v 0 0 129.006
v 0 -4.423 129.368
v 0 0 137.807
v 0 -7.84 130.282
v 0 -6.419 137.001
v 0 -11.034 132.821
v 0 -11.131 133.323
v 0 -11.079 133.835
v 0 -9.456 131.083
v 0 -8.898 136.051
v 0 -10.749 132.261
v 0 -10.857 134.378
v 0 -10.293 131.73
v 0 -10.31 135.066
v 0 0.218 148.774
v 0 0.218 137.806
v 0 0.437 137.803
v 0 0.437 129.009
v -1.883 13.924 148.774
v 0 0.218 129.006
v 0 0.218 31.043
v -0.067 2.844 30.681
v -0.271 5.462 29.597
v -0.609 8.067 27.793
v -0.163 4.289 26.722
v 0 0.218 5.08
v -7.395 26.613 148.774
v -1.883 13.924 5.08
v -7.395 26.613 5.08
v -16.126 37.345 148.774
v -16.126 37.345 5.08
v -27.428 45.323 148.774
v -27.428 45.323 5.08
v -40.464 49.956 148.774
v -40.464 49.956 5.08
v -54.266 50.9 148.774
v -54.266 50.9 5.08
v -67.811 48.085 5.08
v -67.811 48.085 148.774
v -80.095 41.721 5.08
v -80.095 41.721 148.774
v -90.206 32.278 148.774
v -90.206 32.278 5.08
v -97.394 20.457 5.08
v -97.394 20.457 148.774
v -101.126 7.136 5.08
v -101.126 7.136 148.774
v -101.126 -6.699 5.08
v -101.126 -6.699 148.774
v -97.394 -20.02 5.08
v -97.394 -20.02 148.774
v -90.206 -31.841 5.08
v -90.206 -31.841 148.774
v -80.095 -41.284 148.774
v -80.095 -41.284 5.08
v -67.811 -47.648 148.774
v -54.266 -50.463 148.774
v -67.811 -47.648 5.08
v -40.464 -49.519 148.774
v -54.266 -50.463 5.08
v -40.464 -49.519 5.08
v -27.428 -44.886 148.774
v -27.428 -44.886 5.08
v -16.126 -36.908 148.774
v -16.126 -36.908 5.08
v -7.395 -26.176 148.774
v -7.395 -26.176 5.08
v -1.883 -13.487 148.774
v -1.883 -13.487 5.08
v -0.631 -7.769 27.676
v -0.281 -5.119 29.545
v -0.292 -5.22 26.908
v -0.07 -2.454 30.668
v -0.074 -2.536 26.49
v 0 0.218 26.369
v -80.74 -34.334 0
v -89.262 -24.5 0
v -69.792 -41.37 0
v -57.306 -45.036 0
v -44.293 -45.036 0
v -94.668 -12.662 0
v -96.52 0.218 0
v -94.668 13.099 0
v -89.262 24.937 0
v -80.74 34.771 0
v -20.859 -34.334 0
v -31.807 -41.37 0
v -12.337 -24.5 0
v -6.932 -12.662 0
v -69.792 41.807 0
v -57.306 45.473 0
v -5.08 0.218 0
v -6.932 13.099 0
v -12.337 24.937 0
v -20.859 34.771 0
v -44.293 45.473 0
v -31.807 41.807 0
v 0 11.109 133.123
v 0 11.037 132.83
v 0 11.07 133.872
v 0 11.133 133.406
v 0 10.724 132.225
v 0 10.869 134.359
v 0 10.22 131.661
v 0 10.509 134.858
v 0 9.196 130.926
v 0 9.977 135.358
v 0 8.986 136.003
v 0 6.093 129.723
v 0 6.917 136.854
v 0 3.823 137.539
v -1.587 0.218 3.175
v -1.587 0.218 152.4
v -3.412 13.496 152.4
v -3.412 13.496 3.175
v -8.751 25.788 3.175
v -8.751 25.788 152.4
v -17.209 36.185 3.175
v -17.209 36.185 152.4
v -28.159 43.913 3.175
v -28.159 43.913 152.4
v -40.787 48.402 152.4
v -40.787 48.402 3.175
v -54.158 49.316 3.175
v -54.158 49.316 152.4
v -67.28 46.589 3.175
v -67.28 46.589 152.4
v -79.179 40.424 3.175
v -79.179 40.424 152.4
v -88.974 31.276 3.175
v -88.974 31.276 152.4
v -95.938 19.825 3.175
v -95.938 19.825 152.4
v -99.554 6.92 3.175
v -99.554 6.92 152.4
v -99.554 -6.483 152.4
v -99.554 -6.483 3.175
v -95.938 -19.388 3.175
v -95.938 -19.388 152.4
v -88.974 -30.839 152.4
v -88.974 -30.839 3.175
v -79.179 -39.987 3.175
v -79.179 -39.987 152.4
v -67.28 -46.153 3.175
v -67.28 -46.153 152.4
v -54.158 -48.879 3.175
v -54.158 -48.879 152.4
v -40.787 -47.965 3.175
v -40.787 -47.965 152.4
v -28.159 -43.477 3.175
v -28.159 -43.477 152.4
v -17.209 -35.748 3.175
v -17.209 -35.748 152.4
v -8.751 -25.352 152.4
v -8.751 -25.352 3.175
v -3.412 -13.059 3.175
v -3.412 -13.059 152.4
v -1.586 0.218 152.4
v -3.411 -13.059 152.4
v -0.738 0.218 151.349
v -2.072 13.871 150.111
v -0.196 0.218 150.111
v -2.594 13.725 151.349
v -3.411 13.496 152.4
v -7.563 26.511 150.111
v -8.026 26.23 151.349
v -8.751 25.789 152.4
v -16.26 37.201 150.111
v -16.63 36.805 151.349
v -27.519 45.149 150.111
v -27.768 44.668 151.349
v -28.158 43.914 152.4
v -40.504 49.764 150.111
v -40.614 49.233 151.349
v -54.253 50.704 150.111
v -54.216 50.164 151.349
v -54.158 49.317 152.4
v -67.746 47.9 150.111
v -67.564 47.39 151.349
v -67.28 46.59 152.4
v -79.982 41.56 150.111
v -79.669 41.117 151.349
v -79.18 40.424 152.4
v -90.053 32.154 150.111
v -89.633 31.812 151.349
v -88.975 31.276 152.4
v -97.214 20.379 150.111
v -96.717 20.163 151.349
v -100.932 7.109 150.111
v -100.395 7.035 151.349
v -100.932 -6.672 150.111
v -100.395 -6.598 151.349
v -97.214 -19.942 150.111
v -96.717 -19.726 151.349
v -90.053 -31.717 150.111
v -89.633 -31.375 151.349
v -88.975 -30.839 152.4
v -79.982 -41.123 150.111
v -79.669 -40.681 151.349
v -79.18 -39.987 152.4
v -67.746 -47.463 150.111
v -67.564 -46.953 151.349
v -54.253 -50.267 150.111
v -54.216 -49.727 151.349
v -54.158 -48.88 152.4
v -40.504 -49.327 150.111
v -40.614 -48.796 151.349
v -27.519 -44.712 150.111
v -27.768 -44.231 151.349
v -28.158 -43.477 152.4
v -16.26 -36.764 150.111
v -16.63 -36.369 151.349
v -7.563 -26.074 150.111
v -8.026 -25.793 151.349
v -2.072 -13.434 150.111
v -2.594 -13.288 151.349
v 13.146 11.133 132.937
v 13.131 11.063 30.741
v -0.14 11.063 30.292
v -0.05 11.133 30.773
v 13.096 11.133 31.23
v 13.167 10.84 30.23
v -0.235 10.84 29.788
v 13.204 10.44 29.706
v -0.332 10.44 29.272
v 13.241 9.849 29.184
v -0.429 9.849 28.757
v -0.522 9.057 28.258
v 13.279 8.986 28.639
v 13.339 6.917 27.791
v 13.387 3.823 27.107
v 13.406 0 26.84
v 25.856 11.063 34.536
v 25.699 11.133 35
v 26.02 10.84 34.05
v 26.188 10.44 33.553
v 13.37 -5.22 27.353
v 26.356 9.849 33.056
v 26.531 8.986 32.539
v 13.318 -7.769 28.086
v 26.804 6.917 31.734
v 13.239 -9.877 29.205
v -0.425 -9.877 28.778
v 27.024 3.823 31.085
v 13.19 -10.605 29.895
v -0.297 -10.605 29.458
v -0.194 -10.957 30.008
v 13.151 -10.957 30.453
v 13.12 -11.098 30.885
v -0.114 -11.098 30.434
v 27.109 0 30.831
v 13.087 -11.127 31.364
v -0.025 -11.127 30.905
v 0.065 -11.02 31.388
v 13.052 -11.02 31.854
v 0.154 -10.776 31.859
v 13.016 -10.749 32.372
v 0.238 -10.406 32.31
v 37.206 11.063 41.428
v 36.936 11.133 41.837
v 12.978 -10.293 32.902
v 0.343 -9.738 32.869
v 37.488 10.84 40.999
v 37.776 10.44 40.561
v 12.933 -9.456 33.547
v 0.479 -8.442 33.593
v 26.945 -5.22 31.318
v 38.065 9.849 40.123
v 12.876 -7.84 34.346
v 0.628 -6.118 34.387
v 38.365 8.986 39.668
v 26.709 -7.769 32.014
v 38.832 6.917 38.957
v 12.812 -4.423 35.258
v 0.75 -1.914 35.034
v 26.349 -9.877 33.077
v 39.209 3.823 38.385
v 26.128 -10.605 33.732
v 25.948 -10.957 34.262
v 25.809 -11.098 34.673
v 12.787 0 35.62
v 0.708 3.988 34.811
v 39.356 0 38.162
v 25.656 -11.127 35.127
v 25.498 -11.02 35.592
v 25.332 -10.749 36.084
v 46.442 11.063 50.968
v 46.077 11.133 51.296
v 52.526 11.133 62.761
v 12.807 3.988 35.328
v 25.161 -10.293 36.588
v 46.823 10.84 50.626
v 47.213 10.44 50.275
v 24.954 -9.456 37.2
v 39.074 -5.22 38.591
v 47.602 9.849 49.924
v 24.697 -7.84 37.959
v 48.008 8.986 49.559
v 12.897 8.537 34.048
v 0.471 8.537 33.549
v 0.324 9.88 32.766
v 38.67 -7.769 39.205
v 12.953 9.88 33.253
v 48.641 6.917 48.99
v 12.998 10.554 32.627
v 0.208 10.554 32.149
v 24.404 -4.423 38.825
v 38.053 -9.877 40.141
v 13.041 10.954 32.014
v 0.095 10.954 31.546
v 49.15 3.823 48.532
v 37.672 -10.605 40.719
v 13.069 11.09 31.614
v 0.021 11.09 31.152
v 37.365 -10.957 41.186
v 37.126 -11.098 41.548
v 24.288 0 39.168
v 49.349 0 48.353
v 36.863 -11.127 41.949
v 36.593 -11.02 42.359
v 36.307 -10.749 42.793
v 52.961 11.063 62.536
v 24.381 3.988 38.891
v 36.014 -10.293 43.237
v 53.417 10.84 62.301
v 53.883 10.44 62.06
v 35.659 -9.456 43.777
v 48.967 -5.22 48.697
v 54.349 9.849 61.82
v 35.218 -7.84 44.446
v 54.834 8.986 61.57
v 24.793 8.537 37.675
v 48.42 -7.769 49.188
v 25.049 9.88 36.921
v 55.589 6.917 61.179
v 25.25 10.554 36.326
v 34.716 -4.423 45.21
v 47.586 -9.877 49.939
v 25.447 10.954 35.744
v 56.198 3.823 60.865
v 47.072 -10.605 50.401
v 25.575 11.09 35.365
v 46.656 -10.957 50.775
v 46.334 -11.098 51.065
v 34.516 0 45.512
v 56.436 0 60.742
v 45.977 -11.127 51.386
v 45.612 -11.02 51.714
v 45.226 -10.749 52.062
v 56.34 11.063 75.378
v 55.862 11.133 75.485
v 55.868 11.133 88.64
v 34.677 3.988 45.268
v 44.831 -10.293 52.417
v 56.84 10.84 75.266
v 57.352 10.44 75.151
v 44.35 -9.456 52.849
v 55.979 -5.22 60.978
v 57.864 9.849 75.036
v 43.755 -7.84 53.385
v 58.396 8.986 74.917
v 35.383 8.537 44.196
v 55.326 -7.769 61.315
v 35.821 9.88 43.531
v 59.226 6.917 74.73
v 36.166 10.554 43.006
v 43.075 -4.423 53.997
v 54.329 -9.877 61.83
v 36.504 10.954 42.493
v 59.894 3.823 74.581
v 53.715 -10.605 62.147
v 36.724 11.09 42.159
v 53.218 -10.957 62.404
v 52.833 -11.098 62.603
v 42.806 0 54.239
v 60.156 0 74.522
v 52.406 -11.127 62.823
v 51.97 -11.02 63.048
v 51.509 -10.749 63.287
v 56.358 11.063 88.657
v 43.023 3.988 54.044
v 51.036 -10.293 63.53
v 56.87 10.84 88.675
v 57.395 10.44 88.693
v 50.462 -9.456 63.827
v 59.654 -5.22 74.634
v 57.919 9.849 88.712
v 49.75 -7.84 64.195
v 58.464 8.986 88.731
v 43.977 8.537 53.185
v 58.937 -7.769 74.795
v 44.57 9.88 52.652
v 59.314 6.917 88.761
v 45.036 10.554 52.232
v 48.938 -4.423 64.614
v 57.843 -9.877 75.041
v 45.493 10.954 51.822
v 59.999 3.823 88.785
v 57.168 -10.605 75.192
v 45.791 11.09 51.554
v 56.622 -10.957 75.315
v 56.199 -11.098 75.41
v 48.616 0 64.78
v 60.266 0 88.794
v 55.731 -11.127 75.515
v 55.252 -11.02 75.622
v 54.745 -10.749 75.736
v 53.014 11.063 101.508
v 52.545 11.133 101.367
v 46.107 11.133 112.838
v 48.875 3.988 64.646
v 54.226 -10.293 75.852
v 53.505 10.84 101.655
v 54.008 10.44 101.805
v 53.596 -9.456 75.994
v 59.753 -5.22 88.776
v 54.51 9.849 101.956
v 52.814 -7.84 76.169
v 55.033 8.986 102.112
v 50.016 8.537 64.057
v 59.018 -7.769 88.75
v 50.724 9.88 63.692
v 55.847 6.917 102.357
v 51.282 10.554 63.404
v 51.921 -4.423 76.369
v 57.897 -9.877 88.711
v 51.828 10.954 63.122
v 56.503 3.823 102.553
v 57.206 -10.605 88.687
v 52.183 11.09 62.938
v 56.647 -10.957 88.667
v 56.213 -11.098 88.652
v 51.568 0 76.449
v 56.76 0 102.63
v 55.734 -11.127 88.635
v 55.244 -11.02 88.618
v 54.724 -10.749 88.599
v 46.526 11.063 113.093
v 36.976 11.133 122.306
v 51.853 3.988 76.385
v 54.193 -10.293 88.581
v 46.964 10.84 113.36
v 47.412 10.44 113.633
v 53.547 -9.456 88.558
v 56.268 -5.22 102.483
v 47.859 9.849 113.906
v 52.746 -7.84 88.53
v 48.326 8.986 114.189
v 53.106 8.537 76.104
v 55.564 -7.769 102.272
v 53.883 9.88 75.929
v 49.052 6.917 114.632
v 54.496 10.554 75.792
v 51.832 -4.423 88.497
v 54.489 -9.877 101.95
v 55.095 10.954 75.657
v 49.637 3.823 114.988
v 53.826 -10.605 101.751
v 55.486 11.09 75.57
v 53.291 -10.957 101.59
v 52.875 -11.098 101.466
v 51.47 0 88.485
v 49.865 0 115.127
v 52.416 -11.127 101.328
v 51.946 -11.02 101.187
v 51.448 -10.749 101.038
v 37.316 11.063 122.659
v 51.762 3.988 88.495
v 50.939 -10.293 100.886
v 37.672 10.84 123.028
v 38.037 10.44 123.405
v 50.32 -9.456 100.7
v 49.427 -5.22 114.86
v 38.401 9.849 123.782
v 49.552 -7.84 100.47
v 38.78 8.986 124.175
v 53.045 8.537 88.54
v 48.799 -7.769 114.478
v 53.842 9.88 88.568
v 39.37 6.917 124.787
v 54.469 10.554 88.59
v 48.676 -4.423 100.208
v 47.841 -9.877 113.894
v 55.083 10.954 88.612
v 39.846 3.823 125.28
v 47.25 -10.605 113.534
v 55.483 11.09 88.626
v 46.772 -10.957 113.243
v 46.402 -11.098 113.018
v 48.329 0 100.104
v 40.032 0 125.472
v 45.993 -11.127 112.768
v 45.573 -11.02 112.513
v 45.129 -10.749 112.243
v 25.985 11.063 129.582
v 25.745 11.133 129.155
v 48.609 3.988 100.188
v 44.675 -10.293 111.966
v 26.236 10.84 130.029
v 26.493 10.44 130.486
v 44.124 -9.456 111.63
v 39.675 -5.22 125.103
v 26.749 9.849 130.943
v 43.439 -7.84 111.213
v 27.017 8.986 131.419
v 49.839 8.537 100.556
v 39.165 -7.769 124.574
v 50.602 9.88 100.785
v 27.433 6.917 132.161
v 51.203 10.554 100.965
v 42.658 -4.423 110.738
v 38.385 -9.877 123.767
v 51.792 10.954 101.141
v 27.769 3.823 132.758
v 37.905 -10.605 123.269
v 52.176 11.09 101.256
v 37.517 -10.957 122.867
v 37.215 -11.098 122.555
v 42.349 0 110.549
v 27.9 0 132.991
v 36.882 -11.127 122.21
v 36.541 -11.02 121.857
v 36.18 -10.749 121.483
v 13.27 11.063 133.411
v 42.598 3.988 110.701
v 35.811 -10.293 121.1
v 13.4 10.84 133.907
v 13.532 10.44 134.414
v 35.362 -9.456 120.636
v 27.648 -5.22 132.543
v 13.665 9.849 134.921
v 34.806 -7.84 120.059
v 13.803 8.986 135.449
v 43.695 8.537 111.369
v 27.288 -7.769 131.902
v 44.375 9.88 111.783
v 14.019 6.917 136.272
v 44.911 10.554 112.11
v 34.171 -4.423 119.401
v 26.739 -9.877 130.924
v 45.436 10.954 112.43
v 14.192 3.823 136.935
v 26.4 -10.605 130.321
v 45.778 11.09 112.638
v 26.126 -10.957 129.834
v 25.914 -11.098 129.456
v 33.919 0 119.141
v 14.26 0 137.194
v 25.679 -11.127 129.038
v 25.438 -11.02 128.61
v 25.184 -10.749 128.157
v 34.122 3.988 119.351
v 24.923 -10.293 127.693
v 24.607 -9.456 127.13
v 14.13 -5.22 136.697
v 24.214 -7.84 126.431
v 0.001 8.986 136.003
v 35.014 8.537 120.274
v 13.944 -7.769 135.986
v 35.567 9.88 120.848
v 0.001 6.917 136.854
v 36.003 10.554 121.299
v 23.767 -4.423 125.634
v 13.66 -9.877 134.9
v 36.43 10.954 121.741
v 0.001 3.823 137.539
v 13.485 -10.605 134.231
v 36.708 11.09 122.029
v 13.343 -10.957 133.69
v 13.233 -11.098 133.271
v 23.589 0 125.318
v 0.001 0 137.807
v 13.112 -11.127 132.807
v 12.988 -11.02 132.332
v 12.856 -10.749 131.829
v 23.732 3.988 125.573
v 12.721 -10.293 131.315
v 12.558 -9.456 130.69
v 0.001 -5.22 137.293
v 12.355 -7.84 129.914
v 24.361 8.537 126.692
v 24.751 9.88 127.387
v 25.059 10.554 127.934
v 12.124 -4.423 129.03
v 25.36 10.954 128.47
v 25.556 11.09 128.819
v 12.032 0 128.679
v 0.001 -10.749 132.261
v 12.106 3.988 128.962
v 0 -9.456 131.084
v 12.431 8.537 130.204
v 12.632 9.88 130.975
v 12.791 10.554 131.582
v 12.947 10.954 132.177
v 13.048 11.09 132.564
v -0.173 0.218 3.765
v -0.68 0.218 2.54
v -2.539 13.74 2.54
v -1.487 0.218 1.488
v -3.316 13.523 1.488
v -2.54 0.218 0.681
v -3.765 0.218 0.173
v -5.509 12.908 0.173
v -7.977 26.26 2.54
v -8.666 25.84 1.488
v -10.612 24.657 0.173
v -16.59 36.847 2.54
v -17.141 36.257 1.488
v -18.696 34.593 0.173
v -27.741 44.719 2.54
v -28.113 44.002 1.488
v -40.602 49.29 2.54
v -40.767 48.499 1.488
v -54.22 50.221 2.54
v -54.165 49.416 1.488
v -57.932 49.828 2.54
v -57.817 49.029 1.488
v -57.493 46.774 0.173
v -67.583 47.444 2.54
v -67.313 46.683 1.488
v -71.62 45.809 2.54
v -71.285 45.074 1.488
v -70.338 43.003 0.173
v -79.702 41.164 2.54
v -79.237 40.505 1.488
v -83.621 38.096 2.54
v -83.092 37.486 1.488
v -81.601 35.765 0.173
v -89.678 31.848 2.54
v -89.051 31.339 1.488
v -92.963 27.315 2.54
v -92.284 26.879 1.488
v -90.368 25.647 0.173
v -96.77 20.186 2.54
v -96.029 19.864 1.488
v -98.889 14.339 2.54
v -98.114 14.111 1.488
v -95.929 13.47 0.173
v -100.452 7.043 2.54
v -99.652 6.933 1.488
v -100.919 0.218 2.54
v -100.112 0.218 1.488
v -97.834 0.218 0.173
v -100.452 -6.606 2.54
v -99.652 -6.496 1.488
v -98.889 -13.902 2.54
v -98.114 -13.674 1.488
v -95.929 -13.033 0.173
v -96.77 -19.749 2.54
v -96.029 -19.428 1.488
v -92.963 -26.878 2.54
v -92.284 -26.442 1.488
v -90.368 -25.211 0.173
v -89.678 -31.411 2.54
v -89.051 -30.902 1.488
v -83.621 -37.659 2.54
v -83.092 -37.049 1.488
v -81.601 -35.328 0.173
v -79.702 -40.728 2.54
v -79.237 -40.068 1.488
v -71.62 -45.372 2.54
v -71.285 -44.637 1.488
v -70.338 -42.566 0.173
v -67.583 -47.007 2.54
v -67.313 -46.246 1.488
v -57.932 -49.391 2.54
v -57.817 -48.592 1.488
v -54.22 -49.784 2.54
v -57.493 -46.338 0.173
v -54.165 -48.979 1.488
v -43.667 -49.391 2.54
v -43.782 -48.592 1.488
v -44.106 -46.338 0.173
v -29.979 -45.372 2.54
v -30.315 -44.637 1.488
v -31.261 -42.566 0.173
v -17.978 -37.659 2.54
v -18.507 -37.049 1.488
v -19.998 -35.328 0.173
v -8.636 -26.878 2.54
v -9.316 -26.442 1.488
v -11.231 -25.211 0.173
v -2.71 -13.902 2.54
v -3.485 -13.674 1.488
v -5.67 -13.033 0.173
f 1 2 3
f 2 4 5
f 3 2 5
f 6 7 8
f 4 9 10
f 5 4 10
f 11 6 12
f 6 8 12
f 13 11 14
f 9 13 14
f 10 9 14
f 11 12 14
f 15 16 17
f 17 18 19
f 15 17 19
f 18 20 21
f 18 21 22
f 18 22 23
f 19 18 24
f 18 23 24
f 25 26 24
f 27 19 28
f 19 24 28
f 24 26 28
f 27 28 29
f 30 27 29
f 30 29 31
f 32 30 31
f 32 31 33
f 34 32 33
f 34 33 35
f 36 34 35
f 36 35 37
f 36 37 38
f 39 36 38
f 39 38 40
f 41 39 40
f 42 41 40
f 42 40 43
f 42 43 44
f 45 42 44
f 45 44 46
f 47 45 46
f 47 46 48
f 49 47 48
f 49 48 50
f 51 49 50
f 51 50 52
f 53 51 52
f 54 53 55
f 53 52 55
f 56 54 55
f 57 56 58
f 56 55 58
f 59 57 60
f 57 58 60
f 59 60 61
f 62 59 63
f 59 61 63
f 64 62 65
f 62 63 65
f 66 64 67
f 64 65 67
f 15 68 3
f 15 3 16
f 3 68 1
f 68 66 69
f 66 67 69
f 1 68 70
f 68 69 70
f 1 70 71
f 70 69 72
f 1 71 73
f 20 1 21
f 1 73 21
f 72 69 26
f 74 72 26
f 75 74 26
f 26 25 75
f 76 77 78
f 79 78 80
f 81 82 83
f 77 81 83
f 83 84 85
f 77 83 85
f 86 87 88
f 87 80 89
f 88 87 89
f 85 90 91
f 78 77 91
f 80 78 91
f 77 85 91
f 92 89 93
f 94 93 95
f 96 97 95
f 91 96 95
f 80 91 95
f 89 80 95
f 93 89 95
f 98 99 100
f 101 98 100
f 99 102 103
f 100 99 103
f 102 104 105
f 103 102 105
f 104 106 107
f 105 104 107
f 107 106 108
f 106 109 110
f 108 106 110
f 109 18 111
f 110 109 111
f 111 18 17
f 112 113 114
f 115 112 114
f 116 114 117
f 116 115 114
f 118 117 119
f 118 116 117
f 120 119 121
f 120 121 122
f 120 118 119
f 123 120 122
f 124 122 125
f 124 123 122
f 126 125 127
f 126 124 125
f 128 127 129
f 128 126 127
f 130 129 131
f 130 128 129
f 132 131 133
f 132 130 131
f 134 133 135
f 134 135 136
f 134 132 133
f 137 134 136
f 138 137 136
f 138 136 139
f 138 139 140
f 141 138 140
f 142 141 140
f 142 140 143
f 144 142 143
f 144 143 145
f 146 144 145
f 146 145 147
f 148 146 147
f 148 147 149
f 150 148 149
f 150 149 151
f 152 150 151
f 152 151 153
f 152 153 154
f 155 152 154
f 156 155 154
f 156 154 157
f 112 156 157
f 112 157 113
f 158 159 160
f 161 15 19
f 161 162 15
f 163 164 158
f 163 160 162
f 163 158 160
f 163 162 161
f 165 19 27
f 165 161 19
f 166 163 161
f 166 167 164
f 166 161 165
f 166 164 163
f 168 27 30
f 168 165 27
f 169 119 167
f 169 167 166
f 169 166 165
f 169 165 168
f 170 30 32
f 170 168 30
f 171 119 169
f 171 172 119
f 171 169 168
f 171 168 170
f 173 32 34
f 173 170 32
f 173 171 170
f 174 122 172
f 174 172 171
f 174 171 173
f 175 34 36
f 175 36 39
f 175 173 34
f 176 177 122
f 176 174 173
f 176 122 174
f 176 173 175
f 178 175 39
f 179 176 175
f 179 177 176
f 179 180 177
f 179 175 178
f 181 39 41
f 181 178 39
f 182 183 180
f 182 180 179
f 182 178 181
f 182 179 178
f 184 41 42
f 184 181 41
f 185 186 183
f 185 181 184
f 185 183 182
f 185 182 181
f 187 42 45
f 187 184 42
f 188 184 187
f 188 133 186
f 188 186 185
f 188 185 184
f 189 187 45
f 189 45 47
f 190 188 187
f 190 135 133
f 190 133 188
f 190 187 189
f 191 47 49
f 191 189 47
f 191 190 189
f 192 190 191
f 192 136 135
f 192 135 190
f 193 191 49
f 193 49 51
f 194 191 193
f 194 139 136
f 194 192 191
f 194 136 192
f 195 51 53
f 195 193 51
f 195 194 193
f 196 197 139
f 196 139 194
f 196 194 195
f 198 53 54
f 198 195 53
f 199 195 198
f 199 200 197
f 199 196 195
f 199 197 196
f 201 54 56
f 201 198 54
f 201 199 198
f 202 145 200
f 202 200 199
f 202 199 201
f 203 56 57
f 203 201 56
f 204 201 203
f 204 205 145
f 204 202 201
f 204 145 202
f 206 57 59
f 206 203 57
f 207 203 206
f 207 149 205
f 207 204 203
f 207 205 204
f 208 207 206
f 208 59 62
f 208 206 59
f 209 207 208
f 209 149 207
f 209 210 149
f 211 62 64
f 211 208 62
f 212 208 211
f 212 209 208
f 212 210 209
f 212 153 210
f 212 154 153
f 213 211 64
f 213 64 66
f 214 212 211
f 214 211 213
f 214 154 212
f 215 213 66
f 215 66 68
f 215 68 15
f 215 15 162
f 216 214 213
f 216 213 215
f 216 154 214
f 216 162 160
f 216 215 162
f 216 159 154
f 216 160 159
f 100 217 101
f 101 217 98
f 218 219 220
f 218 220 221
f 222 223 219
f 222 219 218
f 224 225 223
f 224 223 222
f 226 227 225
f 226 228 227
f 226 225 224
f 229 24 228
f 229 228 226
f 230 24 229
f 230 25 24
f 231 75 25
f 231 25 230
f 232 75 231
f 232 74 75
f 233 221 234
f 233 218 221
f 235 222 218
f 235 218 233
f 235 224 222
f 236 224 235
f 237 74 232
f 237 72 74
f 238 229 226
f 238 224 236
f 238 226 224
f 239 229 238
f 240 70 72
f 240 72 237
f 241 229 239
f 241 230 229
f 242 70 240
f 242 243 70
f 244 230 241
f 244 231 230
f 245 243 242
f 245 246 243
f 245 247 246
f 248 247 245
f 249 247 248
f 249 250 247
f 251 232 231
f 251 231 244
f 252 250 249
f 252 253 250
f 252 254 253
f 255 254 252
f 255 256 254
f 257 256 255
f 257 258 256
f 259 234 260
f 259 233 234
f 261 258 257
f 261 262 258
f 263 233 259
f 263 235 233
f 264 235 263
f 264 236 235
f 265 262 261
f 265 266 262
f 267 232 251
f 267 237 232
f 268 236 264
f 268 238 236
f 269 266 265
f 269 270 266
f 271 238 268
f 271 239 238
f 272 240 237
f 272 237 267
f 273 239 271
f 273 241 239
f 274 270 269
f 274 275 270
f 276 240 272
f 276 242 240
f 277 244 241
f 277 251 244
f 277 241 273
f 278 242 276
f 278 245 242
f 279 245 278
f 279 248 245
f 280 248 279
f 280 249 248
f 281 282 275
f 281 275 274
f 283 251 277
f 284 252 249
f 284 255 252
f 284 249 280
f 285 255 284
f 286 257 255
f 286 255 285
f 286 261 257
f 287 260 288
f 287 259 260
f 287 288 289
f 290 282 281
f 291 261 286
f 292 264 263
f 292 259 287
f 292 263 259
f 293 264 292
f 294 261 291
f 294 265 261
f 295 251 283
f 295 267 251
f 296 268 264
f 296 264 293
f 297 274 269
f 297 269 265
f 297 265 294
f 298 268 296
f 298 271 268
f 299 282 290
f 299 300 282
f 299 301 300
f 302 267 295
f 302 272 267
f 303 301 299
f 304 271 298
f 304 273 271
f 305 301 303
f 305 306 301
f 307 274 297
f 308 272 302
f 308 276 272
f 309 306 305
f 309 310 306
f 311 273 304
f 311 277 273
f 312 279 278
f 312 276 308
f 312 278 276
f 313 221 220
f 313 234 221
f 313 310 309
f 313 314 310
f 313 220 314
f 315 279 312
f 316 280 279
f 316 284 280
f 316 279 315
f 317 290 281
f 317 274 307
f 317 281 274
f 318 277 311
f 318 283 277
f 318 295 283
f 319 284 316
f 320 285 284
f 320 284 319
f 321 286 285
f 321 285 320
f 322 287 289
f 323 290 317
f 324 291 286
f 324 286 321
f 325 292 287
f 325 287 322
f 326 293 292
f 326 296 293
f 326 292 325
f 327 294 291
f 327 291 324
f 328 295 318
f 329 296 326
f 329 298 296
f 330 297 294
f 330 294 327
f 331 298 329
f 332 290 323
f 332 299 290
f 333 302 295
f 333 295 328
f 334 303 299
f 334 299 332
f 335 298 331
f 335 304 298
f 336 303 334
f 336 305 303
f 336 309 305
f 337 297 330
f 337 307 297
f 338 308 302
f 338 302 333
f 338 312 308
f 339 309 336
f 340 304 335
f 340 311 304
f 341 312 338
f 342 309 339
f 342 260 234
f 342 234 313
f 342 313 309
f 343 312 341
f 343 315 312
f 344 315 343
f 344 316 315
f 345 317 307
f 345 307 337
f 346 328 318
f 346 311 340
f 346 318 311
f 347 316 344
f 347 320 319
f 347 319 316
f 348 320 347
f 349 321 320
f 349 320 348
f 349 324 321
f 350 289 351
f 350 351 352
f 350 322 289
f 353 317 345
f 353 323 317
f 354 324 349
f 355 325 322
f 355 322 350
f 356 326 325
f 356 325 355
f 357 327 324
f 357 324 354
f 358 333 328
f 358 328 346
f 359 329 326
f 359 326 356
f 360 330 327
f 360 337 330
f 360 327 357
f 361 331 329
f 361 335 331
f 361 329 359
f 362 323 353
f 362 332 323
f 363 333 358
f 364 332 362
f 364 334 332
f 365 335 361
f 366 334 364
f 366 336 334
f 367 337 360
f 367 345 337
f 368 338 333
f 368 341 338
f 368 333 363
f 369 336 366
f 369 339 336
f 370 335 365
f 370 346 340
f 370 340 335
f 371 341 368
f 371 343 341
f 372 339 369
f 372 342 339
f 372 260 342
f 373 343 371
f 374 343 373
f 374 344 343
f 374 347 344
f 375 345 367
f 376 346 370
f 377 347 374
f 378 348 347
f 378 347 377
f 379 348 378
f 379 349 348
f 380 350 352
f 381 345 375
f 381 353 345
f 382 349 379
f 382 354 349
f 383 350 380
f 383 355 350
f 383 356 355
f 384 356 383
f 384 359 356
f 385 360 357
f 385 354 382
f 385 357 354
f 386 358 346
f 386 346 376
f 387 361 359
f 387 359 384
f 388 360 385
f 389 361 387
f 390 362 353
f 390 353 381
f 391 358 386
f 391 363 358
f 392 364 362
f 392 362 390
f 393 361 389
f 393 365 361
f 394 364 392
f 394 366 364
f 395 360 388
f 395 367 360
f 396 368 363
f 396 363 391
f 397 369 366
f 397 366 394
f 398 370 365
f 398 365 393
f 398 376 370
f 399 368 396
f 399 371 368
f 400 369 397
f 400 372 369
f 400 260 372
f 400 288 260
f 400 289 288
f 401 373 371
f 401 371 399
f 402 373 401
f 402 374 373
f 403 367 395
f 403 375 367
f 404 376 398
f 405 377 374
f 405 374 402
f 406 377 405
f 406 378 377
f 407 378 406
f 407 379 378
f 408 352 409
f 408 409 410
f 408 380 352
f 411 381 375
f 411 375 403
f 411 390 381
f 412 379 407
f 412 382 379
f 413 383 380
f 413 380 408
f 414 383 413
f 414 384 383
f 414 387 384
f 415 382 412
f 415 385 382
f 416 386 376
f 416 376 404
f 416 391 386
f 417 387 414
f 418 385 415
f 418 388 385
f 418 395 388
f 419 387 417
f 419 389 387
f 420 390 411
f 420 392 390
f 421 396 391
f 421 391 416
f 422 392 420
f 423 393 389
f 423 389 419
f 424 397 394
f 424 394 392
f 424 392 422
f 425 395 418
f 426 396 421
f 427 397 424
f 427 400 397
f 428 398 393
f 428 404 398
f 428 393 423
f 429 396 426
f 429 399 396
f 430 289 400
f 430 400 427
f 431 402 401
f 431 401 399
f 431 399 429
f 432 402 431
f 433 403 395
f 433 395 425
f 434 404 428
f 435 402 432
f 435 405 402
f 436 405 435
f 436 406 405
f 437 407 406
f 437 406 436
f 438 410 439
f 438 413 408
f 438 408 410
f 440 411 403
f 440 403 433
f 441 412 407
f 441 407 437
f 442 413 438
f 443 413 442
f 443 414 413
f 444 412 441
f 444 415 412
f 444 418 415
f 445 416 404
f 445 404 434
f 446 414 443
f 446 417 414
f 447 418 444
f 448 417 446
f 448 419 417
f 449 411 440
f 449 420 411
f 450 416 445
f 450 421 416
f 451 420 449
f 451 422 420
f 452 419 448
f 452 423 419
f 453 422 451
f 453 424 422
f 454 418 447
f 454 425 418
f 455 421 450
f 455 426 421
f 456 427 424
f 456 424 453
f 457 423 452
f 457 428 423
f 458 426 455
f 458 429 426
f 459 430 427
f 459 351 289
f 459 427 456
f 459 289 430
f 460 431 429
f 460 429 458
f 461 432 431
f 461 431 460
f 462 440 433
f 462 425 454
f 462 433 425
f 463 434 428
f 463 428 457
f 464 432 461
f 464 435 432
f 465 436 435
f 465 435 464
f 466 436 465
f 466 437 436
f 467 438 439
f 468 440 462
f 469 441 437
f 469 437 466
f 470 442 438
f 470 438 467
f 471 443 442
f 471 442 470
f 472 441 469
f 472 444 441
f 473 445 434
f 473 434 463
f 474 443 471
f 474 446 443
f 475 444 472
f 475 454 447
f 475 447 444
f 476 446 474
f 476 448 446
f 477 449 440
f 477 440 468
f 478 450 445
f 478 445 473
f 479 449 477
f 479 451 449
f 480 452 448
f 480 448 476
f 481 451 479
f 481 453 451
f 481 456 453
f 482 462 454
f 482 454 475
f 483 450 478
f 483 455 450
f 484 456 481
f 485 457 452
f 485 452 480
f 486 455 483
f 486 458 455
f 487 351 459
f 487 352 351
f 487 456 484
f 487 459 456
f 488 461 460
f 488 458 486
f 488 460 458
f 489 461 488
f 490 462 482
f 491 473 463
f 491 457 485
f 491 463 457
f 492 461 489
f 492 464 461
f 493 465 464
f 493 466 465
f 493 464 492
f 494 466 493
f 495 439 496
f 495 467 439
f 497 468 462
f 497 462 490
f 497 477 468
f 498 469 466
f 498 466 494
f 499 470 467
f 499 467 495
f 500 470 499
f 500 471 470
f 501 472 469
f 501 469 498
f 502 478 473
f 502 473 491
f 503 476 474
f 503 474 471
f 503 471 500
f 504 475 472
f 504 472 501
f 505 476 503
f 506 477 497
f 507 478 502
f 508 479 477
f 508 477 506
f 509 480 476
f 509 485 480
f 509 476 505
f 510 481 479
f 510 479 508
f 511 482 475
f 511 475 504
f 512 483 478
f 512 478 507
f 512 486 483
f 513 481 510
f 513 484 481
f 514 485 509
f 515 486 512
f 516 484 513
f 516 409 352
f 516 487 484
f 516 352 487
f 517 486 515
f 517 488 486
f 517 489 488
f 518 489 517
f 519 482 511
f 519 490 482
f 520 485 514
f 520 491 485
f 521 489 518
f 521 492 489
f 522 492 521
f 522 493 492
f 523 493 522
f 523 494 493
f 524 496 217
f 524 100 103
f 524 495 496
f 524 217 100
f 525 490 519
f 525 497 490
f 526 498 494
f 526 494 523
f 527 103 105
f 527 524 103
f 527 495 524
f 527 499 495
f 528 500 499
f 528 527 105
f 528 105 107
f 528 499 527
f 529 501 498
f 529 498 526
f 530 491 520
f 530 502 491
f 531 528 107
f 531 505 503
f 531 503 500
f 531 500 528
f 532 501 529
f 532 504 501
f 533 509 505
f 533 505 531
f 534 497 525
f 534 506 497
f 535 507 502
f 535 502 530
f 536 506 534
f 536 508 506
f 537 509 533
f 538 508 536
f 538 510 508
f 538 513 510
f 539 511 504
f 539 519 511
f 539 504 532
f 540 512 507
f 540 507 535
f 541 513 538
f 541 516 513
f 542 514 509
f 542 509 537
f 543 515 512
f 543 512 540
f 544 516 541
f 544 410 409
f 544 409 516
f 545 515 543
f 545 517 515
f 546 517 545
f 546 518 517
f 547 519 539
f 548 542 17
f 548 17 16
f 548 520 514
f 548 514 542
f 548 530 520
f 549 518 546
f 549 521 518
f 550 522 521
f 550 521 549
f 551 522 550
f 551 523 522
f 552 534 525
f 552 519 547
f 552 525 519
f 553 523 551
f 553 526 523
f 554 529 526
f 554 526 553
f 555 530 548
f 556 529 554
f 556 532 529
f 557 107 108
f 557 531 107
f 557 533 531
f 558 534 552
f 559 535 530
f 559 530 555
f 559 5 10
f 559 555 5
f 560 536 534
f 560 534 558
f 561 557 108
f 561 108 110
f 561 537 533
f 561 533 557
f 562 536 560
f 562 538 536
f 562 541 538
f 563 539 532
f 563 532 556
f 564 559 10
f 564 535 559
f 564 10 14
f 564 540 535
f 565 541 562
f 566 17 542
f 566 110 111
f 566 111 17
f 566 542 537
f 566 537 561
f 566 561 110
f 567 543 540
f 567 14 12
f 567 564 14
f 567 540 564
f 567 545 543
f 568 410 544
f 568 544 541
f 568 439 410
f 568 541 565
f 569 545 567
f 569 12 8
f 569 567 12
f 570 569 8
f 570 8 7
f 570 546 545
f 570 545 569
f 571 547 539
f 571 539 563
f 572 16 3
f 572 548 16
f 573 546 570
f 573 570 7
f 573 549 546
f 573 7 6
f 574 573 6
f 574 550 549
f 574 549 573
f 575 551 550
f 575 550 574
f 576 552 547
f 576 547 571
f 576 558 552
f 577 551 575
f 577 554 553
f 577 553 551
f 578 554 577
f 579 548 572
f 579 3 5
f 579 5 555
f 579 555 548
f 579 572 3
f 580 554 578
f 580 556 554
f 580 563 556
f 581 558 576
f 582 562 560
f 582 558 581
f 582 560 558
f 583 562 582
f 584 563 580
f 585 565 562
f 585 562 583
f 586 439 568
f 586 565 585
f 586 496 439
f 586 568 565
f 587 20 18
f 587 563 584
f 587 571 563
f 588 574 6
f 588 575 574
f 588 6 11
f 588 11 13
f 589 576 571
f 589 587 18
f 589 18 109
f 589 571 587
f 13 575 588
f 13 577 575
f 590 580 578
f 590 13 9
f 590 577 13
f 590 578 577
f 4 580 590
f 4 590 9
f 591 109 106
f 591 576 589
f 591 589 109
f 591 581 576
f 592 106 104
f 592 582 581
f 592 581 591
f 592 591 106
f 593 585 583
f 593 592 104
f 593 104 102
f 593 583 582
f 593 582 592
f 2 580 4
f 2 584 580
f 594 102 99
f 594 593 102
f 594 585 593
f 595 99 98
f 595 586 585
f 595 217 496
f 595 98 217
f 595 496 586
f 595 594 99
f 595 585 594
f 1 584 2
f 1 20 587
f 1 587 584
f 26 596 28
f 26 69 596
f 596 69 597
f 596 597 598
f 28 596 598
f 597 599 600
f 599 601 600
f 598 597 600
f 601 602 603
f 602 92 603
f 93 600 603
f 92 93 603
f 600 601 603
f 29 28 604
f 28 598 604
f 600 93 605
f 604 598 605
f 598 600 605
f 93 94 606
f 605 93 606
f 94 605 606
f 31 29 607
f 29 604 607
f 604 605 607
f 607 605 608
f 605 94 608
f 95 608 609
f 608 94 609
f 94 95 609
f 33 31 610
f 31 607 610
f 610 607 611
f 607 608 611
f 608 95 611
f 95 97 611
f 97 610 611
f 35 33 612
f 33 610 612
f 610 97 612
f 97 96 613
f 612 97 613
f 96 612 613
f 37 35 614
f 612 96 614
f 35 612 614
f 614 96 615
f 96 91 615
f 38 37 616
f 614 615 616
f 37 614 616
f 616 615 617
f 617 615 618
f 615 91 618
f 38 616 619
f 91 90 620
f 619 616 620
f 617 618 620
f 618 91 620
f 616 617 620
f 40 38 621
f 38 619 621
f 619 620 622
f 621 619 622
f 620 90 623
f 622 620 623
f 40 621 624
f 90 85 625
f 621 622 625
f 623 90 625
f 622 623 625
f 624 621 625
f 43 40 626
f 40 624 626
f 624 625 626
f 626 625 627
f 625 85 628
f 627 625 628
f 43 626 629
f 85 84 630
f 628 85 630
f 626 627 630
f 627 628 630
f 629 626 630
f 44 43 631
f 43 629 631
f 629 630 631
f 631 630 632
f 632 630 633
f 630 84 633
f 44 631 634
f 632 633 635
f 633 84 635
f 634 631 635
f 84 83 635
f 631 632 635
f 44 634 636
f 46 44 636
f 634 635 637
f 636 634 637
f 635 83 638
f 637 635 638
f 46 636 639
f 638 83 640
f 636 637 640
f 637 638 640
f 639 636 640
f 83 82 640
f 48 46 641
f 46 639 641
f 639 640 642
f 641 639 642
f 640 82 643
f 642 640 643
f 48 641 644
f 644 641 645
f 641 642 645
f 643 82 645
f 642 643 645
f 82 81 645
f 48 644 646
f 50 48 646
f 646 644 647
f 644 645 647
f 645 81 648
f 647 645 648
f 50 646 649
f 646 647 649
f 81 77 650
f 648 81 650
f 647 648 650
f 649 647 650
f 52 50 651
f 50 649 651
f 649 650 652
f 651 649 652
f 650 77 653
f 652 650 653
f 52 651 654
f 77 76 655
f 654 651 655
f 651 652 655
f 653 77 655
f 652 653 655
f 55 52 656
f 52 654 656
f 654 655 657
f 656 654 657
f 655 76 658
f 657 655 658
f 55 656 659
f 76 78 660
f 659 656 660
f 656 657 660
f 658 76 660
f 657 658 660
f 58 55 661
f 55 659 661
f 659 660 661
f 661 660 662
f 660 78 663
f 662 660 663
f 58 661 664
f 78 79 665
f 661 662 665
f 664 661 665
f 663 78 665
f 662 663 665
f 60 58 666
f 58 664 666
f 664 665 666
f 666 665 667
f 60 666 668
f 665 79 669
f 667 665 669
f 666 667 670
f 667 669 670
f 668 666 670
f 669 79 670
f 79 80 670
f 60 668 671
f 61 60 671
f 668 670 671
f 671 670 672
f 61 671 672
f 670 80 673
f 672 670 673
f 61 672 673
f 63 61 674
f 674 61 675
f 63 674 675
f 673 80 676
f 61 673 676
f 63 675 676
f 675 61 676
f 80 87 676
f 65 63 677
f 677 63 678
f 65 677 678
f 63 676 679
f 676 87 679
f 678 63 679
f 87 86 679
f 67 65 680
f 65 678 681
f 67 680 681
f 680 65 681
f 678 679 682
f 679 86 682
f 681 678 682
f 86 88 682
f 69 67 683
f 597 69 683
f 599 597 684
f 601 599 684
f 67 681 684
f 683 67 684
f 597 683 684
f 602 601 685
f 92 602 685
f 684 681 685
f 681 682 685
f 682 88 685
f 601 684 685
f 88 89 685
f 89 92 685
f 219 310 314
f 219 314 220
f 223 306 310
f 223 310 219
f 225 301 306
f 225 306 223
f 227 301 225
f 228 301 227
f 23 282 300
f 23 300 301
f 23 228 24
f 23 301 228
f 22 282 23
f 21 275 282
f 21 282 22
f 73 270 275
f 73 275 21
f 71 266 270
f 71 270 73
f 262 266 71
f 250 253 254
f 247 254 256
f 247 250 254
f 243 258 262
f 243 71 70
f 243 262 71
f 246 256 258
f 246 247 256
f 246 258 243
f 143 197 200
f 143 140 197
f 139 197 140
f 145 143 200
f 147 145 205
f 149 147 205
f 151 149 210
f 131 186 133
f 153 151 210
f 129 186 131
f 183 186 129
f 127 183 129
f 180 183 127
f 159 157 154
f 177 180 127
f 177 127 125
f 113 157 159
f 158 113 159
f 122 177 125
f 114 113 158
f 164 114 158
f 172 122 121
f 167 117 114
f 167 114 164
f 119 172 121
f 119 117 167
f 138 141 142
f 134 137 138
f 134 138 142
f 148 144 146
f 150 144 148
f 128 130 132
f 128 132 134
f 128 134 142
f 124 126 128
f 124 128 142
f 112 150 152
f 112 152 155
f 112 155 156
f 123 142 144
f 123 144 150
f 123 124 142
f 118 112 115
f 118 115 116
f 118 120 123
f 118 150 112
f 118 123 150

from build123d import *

# Parameters (mm, degrees)
F0_R     = 50.8
F0_R_2   = 49.2125
F1_DEPTH = 152.4
F2_DEPTH = 3.175
F7_R     = 5.08


# Not quite as in the source:
# - a fillet or chamfer that OpenCascade refuses, or shapes differently, is made with other operations: its cross-section is extruded or revolved along the edge and cut away or added


with BuildPart() as f1:
    # F0 (on Top) → F1 (new body)
    with BuildSketch(Plane.XY):
        with Locations((-50.7995303897, 0.2184311975)):
            Circle(F0_R)
        with Locations((-50.7995303897, 0.2184311975)):
            Circle(F0_R_2, mode=Mode.SUBTRACT)
    extrude(amount=F1_DEPTH)

    # F0 (on Top) → F2 (join)
    with BuildSketch(Plane.XY):
        with Locations((-50.7995303897, 0.2184311975)):
            Circle(F0_R_2)
    extrude(amount=F2_DEPTH)

    # F5: sweep along a path in F4
    with BuildLine(Plane.XZ) as f5_path:
        ThreePointArc((0, 31.0402940959), (56.0160848718, 82.0873966441), (0, 133.1344991922))
    # F3 (on Right) → F5 (sweep)
    with BuildSketch(Plane.YZ):
        with BuildLine():
            add(Edge.make_bspline(
                [(11.1326146871, 133.4060281515), (11.1326146871, 141.0279565911), (-5.5663073435, 137.2169923713), (-22.2652293742, 133.4060281515), (-5.5663073435, 129.5950639317), (11.1326146871, 125.7840997119), (11.1326146871, 133.4060281515)],
                knots=[0, 0, 0, 2.0943951024, 2.0943951024, 4.1887902048, 4.1887902048, 6.2831853072, 6.2831853072, 6.2831853072], degree=2, weights=[1, 0.5, 1, 0.5, 1, 0.5, 1]))
        make_face()
    sweep(path=f5_path.line)

    # F6: fillet of radius 5.08 on 1 edges, made by hand

    # F6_s1 → F6_t2 (revolve, cut)
    with BuildSketch(Plane.XZ.offset(-0.2184311975)):
        with BuildLine():
            ThreePointArc((0.0008696103, 148.7105678213), (-0.412881514, 150.7189630856), (-1.5867553659, 152.4002904513))
            Line((-1.5867553659, 152.4002904513), (-1.237381295, 152.7692627143))
            ThreePointArc((-1.237381295, 152.7692627143), (-0.7931428778, 152.9081365685), (0.0004696103, 152.9081365685))
            Line((0.0004696103, 152.9081365685), (0.5086061789, 152.4))
            ThreePointArc((0.5086061789, 152.4), (0.5086061789, 150.5552839107), (0.5090061789, 148.7105678213))
            Line((0.5090061789, 148.7105678213), (0.0008696103, 148.7105678213))
        make_face()
    revolve(axis=Axis((-50.7995303897, 0.2184311975, 152.4), (0, 0, 1)), mode=Mode.SUBTRACT)

    # F7
    f7_edges = [f1.edges().sort_by_distance(p)[0] for p in [
        (-101.59953, 0.218431, 0),
    ]]
    fillet(f7_edges, radius=F7_R)


solid = f1.part
